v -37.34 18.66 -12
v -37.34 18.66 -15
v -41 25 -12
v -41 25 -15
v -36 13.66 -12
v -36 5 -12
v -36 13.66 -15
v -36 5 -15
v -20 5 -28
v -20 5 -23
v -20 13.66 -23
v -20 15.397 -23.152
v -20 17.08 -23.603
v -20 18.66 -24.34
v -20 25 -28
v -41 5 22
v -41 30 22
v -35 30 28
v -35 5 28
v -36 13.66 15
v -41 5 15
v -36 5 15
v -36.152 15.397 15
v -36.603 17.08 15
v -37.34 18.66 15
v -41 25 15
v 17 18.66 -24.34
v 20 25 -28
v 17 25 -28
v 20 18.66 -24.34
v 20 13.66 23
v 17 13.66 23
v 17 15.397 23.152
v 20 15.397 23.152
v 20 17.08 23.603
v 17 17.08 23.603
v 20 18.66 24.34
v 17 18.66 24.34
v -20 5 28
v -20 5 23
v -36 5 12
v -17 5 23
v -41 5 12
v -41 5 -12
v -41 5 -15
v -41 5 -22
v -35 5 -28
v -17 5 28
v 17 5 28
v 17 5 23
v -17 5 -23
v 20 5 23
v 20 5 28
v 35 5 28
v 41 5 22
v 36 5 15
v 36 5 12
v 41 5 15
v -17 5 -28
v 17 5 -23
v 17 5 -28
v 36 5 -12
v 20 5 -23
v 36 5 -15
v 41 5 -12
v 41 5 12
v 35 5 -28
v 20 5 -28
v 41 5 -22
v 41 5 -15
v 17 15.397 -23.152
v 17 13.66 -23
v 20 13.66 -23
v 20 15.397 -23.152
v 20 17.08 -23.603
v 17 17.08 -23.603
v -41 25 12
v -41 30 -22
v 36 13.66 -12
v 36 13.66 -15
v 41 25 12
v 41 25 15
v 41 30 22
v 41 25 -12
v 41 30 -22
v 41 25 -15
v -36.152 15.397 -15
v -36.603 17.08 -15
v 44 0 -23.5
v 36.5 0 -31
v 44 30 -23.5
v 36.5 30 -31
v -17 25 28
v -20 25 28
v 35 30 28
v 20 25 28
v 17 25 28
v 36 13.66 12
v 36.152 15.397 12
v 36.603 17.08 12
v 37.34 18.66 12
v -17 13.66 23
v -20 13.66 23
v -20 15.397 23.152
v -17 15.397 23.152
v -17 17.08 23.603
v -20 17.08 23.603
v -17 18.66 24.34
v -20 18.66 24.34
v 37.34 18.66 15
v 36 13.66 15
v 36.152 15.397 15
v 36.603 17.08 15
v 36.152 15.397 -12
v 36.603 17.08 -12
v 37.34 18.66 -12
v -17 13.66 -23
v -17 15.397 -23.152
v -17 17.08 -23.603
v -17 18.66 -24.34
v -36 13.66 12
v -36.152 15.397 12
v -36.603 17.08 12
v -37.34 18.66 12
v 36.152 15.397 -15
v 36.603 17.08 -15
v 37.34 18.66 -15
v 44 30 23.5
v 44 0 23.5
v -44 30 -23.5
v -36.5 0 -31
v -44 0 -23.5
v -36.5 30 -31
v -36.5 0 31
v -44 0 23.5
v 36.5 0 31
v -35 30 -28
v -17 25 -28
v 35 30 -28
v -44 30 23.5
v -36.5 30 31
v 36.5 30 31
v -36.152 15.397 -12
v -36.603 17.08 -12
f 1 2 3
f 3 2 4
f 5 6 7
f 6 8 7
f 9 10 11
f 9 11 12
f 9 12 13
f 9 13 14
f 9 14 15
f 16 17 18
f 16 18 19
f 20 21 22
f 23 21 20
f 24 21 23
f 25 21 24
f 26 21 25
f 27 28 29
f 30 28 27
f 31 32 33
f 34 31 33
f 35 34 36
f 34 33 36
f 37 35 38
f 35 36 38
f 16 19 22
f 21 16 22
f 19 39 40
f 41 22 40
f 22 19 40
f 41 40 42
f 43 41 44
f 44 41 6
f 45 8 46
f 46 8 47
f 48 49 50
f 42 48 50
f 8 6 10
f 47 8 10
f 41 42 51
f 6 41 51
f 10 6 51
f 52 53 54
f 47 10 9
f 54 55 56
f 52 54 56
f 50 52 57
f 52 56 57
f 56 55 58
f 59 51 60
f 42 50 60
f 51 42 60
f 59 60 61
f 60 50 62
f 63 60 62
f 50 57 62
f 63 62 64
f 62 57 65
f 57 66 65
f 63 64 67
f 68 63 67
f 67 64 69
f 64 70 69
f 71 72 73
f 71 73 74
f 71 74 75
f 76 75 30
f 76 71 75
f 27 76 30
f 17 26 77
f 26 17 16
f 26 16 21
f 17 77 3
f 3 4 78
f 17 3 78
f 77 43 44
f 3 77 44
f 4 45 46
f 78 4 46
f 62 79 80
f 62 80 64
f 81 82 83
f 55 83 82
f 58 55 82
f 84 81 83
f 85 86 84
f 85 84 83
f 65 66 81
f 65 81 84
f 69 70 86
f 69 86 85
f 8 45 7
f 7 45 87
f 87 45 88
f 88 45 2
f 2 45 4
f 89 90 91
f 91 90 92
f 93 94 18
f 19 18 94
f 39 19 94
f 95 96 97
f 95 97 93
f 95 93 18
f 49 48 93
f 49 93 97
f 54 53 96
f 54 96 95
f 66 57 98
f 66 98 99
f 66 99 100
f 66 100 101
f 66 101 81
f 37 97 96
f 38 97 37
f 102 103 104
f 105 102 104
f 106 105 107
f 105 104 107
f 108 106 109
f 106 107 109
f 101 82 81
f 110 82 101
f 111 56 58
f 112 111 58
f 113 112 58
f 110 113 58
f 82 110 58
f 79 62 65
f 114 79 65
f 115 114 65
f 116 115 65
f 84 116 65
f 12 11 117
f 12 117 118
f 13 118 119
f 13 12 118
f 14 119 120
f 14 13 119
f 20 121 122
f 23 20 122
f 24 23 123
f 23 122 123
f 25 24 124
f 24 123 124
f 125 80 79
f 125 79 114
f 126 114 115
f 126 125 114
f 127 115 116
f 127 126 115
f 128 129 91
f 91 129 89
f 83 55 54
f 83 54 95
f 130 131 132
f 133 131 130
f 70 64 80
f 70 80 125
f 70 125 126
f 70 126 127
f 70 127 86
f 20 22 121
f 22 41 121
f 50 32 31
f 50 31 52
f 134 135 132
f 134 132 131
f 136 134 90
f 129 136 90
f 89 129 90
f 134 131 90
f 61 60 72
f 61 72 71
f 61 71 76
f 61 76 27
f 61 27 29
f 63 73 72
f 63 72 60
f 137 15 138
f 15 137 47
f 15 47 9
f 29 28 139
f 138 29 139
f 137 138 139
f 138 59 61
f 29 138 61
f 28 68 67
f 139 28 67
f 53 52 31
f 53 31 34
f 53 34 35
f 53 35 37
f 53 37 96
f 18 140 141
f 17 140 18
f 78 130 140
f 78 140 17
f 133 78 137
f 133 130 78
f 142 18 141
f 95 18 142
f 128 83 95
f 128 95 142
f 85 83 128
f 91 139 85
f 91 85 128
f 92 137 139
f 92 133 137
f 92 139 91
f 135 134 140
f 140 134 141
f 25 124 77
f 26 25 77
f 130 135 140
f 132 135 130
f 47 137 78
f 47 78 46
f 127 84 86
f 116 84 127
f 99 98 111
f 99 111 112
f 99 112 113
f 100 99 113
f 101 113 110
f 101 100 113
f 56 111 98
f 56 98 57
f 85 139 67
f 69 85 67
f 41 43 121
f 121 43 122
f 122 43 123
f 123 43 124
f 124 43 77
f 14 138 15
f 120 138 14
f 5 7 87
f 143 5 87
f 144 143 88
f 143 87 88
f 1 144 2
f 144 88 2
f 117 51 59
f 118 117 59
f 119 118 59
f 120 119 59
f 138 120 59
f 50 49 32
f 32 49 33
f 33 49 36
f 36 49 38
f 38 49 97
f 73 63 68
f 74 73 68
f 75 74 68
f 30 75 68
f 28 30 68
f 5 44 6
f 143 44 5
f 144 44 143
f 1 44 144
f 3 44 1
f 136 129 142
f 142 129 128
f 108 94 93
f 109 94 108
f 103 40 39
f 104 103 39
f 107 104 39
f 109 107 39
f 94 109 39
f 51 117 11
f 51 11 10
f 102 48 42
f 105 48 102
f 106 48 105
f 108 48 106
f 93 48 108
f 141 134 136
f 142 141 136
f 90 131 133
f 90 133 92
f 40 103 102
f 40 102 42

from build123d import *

# Parameters (mm, degrees)
SKETCH_3_W                 = 88
SKETCH_3_H                 = 62
EXTRUDE_2_DEPTH            = 30
SHELL_1_T                  = -3
SHELL_1_THICKNESS_2_FACE_W = 56
SHELL_1_THICKNESS_2_FACE_H = 82
SHELL_1_THICKNESS_2_DEPTH  = 2
EXTRUDE_3_DEPTH            = 15
FILLET_1_R                 = 10
CUT_EXTRUDE_1_DEPTH        = 12
EXTRUDE_4_DEPTH            = 20
FILLET_2_R                 = 10
CUT_EXTRUDE_2_DEPTH        = 17
CHAMFER_1_SIZE             = 6
CHAMFER_2_SIZE             = 7.5


with BuildPart() as part:
    # 草图3 → 凸台-拉伸2 (new body)
    with BuildSketch(Plane(origin=(0, 0, 0), x_dir=(1, 0, 0), z_dir=(0, 1, 0))):
        Rectangle(SKETCH_3_W, SKETCH_3_H)
    extrude(amount=EXTRUDE_2_DEPTH)

    # 抽壳1
    shell_1_openings = [part.faces().sort_by_distance(p)[0] for p in [
        (0, 30, 0),
    ]]
    offset(amount=SHELL_1_T, openings=shell_1_openings, kind=Kind.INTERSECTION)

    # 抽壳1 thickness 2 face (on inner face of the shell) → 抽壳1 thickness 2 (add)
    with BuildSketch(Plane(origin=(0, 3, 0), x_dir=(0, 0, -1), z_dir=(0, -1, 0))):
        Rectangle(SHELL_1_THICKNESS_2_FACE_W, SHELL_1_THICKNESS_2_FACE_H)
    extrude(amount=-SHELL_1_THICKNESS_2_DEPTH)

    # 草图5 → 凸台-拉伸3 (add, symmetric)
    with BuildSketch(Plane.XY):
        Polygon((-41, 25), (-41, 5), (-36, 5), (-36, 16.339745962), align=None)
        Polygon((36, 5), (41, 5), (41, 25), (36, 16.339745962), align=None)
    extrude(amount=EXTRUDE_3_DEPTH, both=True)

    # 圆角1
    fillet_1_edges = [part.edges().sort_by_distance(p)[0] for p in [
        (-36, 16.339745962, 0),
        (36, 16.339745962, 0),
    ]]
    fillet(fillet_1_edges, radius=FILLET_1_R)

    # 草图6 → 切除-拉伸1 (cut, symmetric)
    with BuildSketch(Plane.XY):
        Polygon((36, 5), (41, 5), (41, 25), (36, 16.339745962), align=None)
        Polygon((-41, 25), (-41, 5), (-36, 5), (-36, 16.339745962), align=None)
    extrude(amount=CUT_EXTRUDE_1_DEPTH, both=True, mode=Mode.SUBTRACT)

    # 草图7 → 凸台-拉伸4 (add, symmetric)
    with BuildSketch(Plane(origin=(0, 0, 0), x_dir=(0, 0, -1), z_dir=(1, 0, 0))):
        Polygon((-28, 25), (-23, 16.339745962), (-23, 5), (-28, 5), align=None)
        Polygon((23, 5), (28, 5), (28, 25), (23, 16.339745962), align=None)
    extrude(amount=EXTRUDE_4_DEPTH, both=True)

    # 圆角2
    fillet_2_edges = [part.edges().sort_by_distance(p)[0] for p in [
        (0, 16.339745962, 23),
        (0, 16.339745962, -23),
    ]]
    fillet(fillet_2_edges, radius=FILLET_2_R)

    # 草图8 → 切除-拉伸2 (cut, symmetric)
    with BuildSketch(Plane(origin=(0, 0, 0), x_dir=(0, 0, -1), z_dir=(1, 0, 0))):
        Polygon((23, 5), (28, 5), (28, 25), (23, 16.339745962), align=None)
        Polygon((-23, 16.339745962), (-28, 25), (-28, 5), (-23, 5), align=None)
    extrude(amount=CUT_EXTRUDE_2_DEPTH, both=True, mode=Mode.SUBTRACT)

    # 倒角1
    chamfer_1_edges = [part.edges().sort_by_distance(p)[0] for p in [
        (-41, 17.5, -28),
        (-41, 17.5, 28),
        (41, 17.5, 28),
        (41, 17.5, -28),
    ]]
    chamfer(chamfer_1_edges, length=CHAMFER_1_SIZE)

    # 倒角2
    chamfer_2_edges = [part.edges().sort_by_distance(p)[0] for p in [
        (-44, 15, -31),
        (44, 15, -31),
        (44, 15, 31),
        (-44, 15, 31),
    ]]
    chamfer(chamfer_2_edges, length=CHAMFER_2_SIZE)


solid = part.part
